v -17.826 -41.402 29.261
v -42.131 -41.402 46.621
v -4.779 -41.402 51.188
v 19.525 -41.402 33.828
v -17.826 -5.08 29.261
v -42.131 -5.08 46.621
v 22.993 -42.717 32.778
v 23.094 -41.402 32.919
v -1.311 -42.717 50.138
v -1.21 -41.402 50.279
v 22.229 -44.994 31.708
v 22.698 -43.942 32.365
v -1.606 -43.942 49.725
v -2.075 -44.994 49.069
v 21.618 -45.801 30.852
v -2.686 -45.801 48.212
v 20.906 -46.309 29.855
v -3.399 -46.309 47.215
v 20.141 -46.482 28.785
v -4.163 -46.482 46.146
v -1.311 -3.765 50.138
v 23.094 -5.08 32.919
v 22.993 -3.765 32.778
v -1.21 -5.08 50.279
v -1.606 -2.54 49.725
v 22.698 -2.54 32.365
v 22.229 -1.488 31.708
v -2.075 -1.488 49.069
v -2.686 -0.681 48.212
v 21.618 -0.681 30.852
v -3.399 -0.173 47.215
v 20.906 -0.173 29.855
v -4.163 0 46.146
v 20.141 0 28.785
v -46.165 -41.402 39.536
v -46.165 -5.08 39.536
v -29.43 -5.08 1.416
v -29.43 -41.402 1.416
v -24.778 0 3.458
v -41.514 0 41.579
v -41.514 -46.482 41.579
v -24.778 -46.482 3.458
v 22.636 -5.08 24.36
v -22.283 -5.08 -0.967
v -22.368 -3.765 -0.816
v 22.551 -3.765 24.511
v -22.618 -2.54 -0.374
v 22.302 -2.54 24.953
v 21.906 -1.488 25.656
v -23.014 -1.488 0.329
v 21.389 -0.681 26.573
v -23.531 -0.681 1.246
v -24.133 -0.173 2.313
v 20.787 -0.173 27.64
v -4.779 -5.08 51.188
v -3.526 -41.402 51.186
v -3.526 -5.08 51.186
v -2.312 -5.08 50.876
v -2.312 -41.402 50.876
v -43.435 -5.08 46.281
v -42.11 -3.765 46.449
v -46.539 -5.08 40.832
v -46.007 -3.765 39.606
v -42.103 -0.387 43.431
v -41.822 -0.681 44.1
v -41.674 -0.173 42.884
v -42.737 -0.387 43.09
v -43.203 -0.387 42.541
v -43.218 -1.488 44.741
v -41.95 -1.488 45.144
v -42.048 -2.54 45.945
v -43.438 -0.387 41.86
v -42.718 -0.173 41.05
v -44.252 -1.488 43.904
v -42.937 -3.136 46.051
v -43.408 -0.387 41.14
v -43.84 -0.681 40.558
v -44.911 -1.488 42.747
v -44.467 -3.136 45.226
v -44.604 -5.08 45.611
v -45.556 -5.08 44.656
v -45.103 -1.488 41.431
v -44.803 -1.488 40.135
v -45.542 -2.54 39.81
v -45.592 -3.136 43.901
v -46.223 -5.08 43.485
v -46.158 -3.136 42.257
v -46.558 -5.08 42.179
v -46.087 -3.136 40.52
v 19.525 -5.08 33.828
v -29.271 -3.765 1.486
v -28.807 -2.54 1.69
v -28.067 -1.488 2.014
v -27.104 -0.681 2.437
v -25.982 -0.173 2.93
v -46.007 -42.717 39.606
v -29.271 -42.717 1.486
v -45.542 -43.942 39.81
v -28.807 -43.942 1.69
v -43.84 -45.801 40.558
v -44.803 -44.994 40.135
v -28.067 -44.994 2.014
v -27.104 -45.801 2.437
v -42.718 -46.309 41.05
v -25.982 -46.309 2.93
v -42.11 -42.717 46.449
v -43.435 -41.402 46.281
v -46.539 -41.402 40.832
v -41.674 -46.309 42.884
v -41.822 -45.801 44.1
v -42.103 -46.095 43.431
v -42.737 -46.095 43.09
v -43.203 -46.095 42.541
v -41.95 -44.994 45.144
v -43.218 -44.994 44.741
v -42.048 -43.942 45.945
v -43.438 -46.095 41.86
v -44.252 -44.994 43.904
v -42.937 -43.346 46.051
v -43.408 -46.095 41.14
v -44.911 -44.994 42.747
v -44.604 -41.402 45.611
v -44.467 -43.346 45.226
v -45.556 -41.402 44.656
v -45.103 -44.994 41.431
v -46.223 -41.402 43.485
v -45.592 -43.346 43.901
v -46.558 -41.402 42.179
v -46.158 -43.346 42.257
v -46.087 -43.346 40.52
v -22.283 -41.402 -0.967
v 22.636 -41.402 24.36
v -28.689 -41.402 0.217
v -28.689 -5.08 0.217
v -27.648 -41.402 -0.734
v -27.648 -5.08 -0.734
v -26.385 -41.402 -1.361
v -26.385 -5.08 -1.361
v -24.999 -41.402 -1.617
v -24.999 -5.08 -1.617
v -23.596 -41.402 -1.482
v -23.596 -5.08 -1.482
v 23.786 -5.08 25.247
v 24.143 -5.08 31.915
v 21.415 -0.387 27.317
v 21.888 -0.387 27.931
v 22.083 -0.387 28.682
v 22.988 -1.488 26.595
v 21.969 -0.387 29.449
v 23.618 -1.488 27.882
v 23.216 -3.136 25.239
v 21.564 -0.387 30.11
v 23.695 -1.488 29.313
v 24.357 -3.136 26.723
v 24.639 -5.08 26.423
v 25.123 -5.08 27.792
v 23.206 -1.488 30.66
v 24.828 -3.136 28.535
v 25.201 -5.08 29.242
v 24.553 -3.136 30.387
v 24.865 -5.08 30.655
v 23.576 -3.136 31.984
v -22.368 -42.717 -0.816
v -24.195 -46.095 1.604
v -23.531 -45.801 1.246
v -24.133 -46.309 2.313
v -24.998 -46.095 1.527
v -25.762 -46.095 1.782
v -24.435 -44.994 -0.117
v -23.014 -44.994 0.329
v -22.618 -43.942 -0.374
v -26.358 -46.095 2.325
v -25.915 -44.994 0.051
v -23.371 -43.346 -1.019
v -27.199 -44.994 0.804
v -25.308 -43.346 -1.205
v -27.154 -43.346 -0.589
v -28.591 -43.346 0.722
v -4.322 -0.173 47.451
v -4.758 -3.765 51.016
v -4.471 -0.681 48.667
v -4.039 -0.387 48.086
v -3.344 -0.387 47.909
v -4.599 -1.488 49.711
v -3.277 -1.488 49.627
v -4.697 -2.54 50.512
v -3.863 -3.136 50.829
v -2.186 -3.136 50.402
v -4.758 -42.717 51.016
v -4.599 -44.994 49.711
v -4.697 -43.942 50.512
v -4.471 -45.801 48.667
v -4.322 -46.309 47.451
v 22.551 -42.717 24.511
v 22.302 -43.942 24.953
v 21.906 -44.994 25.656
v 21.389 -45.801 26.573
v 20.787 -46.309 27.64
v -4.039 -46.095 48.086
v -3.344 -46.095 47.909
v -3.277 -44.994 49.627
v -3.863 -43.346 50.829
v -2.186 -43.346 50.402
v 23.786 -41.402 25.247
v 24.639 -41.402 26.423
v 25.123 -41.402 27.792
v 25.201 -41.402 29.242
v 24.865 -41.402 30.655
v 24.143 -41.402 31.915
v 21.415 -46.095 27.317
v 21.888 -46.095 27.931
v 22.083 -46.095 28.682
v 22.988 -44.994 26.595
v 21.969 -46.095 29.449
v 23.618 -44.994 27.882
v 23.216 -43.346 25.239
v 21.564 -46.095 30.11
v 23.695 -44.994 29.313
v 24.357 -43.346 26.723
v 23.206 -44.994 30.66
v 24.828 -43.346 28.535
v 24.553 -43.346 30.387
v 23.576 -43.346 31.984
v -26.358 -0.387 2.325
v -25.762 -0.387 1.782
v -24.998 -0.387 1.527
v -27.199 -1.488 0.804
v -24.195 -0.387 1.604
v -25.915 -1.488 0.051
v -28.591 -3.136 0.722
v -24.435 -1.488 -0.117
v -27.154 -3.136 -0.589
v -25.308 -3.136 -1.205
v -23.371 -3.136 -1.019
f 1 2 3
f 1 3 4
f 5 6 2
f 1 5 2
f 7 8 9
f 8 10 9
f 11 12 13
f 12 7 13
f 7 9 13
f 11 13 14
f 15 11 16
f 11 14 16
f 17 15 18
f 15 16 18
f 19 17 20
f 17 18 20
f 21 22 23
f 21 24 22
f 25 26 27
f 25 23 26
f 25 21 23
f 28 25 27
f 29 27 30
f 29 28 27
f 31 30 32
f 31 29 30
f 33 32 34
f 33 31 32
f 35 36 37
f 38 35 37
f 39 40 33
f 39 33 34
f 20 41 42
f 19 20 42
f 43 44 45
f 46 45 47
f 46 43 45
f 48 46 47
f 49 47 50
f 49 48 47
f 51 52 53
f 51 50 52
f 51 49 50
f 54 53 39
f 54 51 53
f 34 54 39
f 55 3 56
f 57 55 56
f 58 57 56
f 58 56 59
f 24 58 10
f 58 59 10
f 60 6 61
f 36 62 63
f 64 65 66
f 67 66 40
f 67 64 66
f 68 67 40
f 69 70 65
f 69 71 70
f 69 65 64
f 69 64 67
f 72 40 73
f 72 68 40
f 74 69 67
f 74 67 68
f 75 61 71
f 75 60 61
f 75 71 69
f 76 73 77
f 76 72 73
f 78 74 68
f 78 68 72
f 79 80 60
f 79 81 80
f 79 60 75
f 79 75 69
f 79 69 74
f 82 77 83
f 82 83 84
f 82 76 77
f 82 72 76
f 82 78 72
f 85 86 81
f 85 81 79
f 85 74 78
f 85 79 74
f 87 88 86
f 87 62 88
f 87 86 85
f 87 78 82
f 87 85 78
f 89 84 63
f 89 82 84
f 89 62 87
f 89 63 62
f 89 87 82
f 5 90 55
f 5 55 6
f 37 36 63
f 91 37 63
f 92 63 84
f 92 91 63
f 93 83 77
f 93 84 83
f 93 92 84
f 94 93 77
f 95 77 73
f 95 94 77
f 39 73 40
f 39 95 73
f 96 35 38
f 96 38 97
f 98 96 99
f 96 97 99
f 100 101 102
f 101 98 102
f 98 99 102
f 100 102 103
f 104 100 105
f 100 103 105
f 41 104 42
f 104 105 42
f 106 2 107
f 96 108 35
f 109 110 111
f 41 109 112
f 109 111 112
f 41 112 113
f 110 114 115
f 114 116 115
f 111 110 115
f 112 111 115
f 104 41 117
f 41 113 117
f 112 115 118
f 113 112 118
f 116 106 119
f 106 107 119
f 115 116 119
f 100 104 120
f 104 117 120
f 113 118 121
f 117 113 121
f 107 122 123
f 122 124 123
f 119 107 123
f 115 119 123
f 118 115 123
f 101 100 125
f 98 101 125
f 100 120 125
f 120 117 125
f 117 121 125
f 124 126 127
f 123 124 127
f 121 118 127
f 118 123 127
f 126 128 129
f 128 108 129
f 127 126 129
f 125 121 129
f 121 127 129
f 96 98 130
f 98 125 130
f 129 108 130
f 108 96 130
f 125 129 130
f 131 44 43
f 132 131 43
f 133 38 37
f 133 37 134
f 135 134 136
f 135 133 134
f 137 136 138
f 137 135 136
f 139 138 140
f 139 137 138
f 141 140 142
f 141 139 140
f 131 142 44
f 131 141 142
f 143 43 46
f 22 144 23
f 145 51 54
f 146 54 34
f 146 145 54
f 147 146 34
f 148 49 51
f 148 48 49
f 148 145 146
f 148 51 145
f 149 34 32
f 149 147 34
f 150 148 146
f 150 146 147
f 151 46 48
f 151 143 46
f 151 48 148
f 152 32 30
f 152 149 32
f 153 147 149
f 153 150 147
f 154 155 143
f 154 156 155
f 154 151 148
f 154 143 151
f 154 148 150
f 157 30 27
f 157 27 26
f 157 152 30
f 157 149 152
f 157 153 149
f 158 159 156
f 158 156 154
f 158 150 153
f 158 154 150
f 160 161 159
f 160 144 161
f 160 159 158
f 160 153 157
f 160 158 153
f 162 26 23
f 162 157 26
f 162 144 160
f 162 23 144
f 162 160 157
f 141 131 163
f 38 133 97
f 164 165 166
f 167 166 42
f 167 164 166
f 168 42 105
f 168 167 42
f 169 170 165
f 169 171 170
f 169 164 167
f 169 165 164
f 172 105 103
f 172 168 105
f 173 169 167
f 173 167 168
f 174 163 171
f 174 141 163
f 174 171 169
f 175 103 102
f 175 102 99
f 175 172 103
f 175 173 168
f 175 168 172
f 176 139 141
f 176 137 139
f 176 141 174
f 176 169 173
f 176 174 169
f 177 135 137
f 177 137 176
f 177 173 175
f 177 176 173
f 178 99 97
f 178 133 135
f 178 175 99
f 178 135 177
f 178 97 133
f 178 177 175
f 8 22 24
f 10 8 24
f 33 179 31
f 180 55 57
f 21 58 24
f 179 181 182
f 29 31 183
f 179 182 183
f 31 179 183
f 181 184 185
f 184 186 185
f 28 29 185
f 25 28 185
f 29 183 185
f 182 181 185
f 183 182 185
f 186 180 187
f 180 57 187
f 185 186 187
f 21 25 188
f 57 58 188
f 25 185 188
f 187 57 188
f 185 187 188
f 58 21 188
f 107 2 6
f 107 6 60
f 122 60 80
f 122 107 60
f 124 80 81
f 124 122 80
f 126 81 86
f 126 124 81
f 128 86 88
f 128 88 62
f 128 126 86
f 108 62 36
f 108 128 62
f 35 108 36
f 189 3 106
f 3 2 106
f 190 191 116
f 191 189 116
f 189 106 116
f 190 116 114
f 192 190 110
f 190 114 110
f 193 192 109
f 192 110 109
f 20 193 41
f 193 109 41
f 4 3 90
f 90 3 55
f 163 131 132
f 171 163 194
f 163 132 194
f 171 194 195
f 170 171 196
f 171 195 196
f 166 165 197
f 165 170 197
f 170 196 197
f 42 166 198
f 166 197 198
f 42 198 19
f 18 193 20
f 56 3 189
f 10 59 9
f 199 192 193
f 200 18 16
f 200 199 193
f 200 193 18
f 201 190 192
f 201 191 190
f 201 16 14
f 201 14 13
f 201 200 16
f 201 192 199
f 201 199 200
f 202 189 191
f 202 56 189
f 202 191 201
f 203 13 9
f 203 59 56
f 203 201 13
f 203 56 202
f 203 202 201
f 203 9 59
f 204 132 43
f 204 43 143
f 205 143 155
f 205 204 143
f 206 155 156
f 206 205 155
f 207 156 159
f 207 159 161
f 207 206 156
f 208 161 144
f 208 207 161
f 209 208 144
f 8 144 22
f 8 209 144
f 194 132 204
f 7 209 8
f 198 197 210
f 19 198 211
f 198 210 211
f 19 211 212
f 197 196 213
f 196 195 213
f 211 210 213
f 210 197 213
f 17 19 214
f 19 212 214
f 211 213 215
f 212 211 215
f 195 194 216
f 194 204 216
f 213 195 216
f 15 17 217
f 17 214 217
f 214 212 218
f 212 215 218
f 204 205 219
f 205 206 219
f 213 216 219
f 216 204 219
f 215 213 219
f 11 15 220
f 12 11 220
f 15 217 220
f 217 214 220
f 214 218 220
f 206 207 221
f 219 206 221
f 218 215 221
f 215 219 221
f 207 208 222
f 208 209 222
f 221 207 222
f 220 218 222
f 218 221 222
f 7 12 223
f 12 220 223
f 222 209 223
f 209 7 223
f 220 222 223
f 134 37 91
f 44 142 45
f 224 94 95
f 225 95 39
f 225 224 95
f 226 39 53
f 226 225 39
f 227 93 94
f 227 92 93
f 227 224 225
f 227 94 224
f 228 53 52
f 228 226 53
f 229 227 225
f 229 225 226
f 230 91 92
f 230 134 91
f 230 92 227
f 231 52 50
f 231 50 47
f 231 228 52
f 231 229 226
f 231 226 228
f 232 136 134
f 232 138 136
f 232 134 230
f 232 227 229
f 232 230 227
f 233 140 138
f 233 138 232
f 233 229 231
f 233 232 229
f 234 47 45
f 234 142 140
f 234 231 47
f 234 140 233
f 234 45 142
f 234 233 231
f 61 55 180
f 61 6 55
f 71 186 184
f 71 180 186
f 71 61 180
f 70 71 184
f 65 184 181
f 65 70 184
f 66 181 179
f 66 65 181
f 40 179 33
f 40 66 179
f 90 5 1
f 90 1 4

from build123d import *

# Parameters (mm, degrees)
F1_DEPTH   = 46.482
F3_R       = 5.08
F1_FACE1_W = 37.6294337092
F1_FACE1_H = 36.322


# Not quite as in the source:
# - a feature of the source that left no trace in its solid (it failed there, or was rolled back) is left out


with BuildPart() as f1:
    # F0 (on Front) → F1 (new body)
    with BuildSketch(Plane.XZ):
        Polygon((-2.8179630172, 51.4278113842), (-48.9117763937, 45.7918867469), (-27.1732080728, -3.7237356883), (29.5886062086, 28.2802637666), align=None)
    extrude(amount=F1_DEPTH)

    # F3
    f3_edges = [f1.edges().sort_by_distance(p)[0] for p in [
        (-2.817963, -23.241, 51.427811),
        (-48.911776, -23.241, 45.791887),
        (-25.86487, 0, 48.609849),
        (-25.86487, -46.482, 48.609849),
        (-38.042492, 0, 21.034076),
        (1.207699, 0, 12.278264),
        (13.385322, 0, 39.854038),
        (-27.173208, -23.241, -3.723736),
        (29.588606, -23.241, 28.280264),
        (1.207699, -46.482, 12.278264),
        (-38.042492, -46.482, 21.034076),
        (13.385322, -46.482, 39.854038),
    ]]
    fillet(f3_edges, radius=F3_R)

    # F4: sweep along a path in F4_path
    with BuildLine(Plane(origin=(23.0940504855, -41.402, 32.9192317736), x_dir=(0.8137334929, 0, -0.5812381633), z_dir=(-0.5812381633, 0, -0.8137334929))) as f4_path:
        Line((0, 0), (-29.867419561, 0))
    # F1_face1 (on face) → F4 (sweep, cut)
    with BuildSketch(Plane(origin=(-25.8648697054, -23.241, 48.6098490655), x_dir=(1, 0, 0), z_dir=(-0.1213668794, 0, 0.9926077174))):
        with Locations((2.4278813649, 0)):
            Rectangle(F1_FACE1_W, F1_FACE1_H)
    sweep(path=f4_path.line, mode=Mode.SUBTRACT)


solid = f1.part
